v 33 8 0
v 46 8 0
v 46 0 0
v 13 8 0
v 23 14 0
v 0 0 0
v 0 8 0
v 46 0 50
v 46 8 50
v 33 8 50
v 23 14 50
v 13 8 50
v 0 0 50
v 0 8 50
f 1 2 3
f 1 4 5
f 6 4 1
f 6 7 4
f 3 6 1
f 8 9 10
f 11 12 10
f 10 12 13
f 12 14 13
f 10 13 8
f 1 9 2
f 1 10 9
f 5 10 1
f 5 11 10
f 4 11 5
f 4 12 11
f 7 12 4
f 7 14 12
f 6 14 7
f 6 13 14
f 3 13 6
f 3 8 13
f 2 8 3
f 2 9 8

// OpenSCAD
$fn = 32;

// ----------------------------------------------------------------------
// V guide rail: vrib, 46 mm wide
// ----------------------------------------------------------------------

// --- parameters (mm) ---
rail_w = 46;              // rail width, X
base_t = 8;               // base plate thickness
v_depth = 6;              // V feature depth / height
v_half_w = 10;            // half width of the V at the base face
plate_t = 50;             // rail length, Z (the extrusion height)

profile = [[0, 0], [46, 0], [46, 8], [33, 8], [23, 14], [13, 8], [0, 8]];  // primary outline, 7 points, counter clockwise

// --- the one profile operation ---
linear_extrude(height = plate_t) polygon(points = profile);
